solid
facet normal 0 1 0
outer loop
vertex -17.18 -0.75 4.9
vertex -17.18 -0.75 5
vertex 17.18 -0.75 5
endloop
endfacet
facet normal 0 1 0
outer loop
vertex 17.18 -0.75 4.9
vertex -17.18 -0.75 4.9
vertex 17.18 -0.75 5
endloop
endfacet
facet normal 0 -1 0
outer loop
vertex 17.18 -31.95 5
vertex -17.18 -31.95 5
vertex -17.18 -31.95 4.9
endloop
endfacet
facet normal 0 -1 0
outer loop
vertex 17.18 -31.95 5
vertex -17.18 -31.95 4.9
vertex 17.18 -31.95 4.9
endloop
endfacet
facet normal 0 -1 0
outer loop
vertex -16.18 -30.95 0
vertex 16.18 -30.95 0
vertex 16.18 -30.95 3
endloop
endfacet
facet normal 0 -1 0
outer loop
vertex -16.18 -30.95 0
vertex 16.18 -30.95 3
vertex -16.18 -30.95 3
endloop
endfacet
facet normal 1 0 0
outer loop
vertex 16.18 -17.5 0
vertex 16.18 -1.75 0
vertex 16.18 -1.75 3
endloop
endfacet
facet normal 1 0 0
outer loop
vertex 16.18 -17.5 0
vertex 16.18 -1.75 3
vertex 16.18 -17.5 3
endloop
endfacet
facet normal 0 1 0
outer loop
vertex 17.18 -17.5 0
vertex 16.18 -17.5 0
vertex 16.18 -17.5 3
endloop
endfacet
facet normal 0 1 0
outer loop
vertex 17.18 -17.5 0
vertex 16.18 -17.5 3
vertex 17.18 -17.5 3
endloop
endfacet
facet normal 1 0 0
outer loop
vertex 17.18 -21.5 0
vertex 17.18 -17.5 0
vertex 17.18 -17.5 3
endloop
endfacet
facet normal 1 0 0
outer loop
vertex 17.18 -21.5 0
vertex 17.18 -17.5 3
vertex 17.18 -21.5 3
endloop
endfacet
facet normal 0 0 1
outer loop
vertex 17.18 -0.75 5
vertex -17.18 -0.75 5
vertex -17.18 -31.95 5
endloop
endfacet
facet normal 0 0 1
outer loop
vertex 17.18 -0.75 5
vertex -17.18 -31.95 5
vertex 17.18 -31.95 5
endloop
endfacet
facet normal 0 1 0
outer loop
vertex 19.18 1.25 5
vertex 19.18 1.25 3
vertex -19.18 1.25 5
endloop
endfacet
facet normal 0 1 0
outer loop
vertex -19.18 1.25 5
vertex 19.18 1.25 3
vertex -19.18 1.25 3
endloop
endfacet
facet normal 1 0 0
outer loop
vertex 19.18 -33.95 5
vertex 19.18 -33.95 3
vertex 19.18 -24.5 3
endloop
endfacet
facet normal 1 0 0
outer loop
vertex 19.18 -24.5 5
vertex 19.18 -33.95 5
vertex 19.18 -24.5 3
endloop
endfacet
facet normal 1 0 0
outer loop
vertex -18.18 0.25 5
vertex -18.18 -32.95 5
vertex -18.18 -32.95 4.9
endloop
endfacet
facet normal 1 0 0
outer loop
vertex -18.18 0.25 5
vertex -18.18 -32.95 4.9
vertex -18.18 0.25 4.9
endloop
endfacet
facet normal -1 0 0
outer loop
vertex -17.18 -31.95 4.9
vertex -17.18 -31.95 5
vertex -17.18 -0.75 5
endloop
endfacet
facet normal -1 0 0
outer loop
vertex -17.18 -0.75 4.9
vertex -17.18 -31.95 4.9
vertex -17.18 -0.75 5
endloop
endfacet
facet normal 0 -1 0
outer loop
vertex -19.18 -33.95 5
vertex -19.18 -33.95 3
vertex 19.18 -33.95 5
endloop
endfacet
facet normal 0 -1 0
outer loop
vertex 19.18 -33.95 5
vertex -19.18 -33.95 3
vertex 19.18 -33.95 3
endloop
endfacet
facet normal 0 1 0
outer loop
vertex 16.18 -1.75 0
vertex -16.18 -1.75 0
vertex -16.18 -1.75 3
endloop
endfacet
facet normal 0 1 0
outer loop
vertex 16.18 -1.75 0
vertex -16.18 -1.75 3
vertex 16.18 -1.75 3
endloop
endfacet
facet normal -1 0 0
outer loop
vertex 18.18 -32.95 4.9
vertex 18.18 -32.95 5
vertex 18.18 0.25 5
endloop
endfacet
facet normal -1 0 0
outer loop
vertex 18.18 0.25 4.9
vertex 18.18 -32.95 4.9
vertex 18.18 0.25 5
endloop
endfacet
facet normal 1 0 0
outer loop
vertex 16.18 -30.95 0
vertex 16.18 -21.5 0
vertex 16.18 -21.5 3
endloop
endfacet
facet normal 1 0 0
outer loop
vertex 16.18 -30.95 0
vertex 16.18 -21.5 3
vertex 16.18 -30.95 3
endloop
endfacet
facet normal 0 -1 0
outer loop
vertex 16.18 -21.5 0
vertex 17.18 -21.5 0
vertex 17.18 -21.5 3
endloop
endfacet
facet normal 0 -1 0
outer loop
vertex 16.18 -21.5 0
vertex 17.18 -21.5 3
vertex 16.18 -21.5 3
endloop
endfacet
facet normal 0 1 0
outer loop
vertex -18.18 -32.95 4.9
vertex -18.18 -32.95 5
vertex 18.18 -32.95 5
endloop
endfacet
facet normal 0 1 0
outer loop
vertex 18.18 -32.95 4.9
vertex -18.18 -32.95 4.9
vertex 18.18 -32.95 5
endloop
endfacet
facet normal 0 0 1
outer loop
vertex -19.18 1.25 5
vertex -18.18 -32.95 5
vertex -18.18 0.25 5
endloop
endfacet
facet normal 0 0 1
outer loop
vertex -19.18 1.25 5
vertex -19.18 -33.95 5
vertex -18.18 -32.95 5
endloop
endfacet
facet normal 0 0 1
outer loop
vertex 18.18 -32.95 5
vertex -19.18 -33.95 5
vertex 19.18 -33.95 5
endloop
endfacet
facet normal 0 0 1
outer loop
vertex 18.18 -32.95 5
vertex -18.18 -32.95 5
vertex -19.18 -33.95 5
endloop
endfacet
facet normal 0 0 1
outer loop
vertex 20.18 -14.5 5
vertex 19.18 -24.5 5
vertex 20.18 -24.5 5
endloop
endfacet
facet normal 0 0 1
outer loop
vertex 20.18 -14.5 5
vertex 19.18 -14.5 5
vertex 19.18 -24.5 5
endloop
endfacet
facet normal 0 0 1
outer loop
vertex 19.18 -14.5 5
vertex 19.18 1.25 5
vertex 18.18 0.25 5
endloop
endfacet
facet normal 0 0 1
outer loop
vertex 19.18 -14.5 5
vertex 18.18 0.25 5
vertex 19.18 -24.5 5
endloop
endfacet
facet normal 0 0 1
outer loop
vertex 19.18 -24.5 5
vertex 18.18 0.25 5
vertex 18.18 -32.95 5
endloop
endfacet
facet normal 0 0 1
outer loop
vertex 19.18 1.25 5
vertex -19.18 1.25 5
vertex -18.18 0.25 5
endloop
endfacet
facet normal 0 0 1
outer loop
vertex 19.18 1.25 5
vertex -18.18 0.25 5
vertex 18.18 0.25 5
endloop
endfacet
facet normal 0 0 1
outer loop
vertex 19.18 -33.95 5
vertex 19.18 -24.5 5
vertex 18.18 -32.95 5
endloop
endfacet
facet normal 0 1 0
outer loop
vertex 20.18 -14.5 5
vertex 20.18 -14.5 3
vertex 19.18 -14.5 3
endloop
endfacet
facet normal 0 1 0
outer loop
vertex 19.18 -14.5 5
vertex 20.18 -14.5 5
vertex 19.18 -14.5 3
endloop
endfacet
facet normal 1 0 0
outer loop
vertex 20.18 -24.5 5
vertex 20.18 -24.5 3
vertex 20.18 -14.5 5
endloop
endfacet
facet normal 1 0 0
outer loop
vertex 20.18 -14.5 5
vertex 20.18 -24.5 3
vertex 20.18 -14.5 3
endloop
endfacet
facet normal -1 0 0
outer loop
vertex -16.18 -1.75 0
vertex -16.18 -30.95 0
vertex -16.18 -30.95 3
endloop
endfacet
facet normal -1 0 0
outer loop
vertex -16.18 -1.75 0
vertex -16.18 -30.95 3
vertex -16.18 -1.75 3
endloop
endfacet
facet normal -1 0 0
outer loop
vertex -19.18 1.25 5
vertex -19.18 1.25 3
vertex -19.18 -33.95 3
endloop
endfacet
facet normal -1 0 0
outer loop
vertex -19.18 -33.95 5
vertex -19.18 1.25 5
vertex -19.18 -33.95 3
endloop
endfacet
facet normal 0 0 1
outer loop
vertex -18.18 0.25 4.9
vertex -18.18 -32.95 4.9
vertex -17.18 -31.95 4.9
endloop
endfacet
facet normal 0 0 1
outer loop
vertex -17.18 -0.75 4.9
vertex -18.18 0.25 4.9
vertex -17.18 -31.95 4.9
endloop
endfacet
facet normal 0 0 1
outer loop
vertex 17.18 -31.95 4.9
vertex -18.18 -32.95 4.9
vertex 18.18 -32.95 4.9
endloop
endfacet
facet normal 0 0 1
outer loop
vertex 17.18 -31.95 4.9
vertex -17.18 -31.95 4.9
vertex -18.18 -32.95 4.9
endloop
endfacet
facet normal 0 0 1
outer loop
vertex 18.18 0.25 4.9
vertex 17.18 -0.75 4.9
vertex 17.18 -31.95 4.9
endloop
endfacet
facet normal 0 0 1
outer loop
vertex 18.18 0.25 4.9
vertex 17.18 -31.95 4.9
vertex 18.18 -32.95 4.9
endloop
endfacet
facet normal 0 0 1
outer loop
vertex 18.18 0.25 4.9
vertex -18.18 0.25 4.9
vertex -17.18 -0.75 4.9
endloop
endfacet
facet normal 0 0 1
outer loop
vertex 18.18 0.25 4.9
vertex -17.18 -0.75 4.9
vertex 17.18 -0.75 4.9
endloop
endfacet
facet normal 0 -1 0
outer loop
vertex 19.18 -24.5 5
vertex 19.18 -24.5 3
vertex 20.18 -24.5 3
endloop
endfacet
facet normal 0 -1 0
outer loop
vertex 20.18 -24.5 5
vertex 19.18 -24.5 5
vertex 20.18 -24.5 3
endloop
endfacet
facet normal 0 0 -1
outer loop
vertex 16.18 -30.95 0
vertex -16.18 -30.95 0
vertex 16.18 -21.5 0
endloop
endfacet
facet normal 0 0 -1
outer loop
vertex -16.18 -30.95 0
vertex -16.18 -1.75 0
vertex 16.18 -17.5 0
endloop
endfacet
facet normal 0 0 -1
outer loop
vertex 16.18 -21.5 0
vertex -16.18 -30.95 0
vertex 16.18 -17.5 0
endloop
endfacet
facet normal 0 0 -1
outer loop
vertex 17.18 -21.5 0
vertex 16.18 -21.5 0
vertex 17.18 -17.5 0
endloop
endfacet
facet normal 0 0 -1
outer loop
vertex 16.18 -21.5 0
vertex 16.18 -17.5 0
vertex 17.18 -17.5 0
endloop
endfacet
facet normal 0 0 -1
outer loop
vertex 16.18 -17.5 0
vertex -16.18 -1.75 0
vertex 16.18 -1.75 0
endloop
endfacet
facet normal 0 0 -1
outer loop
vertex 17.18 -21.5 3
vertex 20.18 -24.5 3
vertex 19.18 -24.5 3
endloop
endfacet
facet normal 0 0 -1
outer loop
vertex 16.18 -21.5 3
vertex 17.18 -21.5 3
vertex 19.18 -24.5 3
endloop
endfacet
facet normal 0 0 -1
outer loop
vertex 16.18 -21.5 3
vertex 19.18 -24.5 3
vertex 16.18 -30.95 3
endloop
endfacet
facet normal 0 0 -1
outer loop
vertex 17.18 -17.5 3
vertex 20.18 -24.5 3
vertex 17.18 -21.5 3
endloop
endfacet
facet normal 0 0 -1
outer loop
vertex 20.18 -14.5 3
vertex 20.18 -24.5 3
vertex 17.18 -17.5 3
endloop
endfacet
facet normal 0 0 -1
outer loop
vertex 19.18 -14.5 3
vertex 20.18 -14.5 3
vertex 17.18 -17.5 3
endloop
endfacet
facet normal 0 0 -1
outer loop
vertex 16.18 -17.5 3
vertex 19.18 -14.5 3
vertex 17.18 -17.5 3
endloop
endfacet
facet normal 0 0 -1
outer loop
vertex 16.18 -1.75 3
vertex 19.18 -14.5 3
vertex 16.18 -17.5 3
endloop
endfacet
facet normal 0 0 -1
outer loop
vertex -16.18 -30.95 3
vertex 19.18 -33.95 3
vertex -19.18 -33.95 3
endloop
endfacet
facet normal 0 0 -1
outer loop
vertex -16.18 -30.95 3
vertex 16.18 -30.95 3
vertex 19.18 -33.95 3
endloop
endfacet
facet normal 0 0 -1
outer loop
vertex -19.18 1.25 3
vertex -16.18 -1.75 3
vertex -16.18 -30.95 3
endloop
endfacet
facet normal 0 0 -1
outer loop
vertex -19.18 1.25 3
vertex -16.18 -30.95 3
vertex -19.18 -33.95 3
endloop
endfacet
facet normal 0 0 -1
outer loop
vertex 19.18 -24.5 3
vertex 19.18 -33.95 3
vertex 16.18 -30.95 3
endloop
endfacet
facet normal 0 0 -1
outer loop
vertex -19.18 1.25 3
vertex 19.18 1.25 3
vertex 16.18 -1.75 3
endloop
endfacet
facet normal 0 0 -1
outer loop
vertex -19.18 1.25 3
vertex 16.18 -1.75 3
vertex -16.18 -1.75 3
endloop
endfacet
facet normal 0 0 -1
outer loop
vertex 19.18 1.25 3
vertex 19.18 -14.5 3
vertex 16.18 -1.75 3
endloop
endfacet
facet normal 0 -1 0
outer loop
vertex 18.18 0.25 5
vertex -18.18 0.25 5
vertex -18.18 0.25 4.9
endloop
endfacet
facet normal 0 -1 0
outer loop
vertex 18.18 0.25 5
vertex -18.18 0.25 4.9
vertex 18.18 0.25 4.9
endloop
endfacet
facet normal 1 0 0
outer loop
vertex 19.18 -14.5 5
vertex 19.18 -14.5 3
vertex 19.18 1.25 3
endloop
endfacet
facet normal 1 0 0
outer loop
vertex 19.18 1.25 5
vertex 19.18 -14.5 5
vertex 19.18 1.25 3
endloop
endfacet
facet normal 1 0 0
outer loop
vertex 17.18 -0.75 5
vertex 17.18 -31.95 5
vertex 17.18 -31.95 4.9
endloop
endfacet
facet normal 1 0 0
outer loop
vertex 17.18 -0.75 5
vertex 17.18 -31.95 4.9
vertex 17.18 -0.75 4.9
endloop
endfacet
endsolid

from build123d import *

# Parameters (mm, degrees)
EXTRUDE1_DEPTH     = 5
CUT_EXTRUDE1_DEPTH = 3
SKETCH1_W          = 36.36
SKETCH1_H          = 33.2
SKETCH1_W_2        = 34.36
SKETCH1_H_2        = 31.2
CUT_EXTRUDE2_DEPTH = 0.1


with BuildPart() as part:
    # COMPONENT_OUTLINE → Extrude1 (new body)
    with BuildSketch(Plane.XY):
        Polygon((19.18, -24.5), (20.18, -24.5), (20.18, -14.5), (19.18, -14.5), (19.18, 1.25), (-19.18, 1.25), (-19.18, -33.95), (19.18, -33.95), align=None)
    extrude(amount=EXTRUDE1_DEPTH)

    # Sketch2 → Cut-Extrude1 (cut)
    with BuildSketch(Plane(origin=(0, 0, 0), x_dir=(-1, 0, 0), z_dir=(0, 0, -1))):
        Polygon((-19.18, -24.5), (-19.18, -33.95), (19.18, -33.95), (19.18, 1.25), (-19.18, 1.25), (-19.18, -14.5), (-20.18, -14.5), (-20.18, -24.5), align=None)
        Polygon((-16.18, -21.5), (-16.18, -30.95), (16.18, -30.95), (16.18, -1.75), (-16.18, -1.75), (-16.18, -17.5), (-17.18, -17.5), (-17.18, -21.5), align=None, mode=Mode.SUBTRACT)
    extrude(amount=-CUT_EXTRUDE1_DEPTH, mode=Mode.SUBTRACT)

    # Sketch1 → Cut-Extrude2 (cut)
    with BuildSketch(Plane.XY.offset(5)):
        with Locations((0, -16.35)):
            Rectangle(SKETCH1_W, SKETCH1_H)
        with Locations((0, -16.35)):
            Rectangle(SKETCH1_W_2, SKETCH1_H_2, mode=Mode.SUBTRACT)
    extrude(amount=-CUT_EXTRUDE2_DEPTH, mode=Mode.SUBTRACT)


solid = part.part
